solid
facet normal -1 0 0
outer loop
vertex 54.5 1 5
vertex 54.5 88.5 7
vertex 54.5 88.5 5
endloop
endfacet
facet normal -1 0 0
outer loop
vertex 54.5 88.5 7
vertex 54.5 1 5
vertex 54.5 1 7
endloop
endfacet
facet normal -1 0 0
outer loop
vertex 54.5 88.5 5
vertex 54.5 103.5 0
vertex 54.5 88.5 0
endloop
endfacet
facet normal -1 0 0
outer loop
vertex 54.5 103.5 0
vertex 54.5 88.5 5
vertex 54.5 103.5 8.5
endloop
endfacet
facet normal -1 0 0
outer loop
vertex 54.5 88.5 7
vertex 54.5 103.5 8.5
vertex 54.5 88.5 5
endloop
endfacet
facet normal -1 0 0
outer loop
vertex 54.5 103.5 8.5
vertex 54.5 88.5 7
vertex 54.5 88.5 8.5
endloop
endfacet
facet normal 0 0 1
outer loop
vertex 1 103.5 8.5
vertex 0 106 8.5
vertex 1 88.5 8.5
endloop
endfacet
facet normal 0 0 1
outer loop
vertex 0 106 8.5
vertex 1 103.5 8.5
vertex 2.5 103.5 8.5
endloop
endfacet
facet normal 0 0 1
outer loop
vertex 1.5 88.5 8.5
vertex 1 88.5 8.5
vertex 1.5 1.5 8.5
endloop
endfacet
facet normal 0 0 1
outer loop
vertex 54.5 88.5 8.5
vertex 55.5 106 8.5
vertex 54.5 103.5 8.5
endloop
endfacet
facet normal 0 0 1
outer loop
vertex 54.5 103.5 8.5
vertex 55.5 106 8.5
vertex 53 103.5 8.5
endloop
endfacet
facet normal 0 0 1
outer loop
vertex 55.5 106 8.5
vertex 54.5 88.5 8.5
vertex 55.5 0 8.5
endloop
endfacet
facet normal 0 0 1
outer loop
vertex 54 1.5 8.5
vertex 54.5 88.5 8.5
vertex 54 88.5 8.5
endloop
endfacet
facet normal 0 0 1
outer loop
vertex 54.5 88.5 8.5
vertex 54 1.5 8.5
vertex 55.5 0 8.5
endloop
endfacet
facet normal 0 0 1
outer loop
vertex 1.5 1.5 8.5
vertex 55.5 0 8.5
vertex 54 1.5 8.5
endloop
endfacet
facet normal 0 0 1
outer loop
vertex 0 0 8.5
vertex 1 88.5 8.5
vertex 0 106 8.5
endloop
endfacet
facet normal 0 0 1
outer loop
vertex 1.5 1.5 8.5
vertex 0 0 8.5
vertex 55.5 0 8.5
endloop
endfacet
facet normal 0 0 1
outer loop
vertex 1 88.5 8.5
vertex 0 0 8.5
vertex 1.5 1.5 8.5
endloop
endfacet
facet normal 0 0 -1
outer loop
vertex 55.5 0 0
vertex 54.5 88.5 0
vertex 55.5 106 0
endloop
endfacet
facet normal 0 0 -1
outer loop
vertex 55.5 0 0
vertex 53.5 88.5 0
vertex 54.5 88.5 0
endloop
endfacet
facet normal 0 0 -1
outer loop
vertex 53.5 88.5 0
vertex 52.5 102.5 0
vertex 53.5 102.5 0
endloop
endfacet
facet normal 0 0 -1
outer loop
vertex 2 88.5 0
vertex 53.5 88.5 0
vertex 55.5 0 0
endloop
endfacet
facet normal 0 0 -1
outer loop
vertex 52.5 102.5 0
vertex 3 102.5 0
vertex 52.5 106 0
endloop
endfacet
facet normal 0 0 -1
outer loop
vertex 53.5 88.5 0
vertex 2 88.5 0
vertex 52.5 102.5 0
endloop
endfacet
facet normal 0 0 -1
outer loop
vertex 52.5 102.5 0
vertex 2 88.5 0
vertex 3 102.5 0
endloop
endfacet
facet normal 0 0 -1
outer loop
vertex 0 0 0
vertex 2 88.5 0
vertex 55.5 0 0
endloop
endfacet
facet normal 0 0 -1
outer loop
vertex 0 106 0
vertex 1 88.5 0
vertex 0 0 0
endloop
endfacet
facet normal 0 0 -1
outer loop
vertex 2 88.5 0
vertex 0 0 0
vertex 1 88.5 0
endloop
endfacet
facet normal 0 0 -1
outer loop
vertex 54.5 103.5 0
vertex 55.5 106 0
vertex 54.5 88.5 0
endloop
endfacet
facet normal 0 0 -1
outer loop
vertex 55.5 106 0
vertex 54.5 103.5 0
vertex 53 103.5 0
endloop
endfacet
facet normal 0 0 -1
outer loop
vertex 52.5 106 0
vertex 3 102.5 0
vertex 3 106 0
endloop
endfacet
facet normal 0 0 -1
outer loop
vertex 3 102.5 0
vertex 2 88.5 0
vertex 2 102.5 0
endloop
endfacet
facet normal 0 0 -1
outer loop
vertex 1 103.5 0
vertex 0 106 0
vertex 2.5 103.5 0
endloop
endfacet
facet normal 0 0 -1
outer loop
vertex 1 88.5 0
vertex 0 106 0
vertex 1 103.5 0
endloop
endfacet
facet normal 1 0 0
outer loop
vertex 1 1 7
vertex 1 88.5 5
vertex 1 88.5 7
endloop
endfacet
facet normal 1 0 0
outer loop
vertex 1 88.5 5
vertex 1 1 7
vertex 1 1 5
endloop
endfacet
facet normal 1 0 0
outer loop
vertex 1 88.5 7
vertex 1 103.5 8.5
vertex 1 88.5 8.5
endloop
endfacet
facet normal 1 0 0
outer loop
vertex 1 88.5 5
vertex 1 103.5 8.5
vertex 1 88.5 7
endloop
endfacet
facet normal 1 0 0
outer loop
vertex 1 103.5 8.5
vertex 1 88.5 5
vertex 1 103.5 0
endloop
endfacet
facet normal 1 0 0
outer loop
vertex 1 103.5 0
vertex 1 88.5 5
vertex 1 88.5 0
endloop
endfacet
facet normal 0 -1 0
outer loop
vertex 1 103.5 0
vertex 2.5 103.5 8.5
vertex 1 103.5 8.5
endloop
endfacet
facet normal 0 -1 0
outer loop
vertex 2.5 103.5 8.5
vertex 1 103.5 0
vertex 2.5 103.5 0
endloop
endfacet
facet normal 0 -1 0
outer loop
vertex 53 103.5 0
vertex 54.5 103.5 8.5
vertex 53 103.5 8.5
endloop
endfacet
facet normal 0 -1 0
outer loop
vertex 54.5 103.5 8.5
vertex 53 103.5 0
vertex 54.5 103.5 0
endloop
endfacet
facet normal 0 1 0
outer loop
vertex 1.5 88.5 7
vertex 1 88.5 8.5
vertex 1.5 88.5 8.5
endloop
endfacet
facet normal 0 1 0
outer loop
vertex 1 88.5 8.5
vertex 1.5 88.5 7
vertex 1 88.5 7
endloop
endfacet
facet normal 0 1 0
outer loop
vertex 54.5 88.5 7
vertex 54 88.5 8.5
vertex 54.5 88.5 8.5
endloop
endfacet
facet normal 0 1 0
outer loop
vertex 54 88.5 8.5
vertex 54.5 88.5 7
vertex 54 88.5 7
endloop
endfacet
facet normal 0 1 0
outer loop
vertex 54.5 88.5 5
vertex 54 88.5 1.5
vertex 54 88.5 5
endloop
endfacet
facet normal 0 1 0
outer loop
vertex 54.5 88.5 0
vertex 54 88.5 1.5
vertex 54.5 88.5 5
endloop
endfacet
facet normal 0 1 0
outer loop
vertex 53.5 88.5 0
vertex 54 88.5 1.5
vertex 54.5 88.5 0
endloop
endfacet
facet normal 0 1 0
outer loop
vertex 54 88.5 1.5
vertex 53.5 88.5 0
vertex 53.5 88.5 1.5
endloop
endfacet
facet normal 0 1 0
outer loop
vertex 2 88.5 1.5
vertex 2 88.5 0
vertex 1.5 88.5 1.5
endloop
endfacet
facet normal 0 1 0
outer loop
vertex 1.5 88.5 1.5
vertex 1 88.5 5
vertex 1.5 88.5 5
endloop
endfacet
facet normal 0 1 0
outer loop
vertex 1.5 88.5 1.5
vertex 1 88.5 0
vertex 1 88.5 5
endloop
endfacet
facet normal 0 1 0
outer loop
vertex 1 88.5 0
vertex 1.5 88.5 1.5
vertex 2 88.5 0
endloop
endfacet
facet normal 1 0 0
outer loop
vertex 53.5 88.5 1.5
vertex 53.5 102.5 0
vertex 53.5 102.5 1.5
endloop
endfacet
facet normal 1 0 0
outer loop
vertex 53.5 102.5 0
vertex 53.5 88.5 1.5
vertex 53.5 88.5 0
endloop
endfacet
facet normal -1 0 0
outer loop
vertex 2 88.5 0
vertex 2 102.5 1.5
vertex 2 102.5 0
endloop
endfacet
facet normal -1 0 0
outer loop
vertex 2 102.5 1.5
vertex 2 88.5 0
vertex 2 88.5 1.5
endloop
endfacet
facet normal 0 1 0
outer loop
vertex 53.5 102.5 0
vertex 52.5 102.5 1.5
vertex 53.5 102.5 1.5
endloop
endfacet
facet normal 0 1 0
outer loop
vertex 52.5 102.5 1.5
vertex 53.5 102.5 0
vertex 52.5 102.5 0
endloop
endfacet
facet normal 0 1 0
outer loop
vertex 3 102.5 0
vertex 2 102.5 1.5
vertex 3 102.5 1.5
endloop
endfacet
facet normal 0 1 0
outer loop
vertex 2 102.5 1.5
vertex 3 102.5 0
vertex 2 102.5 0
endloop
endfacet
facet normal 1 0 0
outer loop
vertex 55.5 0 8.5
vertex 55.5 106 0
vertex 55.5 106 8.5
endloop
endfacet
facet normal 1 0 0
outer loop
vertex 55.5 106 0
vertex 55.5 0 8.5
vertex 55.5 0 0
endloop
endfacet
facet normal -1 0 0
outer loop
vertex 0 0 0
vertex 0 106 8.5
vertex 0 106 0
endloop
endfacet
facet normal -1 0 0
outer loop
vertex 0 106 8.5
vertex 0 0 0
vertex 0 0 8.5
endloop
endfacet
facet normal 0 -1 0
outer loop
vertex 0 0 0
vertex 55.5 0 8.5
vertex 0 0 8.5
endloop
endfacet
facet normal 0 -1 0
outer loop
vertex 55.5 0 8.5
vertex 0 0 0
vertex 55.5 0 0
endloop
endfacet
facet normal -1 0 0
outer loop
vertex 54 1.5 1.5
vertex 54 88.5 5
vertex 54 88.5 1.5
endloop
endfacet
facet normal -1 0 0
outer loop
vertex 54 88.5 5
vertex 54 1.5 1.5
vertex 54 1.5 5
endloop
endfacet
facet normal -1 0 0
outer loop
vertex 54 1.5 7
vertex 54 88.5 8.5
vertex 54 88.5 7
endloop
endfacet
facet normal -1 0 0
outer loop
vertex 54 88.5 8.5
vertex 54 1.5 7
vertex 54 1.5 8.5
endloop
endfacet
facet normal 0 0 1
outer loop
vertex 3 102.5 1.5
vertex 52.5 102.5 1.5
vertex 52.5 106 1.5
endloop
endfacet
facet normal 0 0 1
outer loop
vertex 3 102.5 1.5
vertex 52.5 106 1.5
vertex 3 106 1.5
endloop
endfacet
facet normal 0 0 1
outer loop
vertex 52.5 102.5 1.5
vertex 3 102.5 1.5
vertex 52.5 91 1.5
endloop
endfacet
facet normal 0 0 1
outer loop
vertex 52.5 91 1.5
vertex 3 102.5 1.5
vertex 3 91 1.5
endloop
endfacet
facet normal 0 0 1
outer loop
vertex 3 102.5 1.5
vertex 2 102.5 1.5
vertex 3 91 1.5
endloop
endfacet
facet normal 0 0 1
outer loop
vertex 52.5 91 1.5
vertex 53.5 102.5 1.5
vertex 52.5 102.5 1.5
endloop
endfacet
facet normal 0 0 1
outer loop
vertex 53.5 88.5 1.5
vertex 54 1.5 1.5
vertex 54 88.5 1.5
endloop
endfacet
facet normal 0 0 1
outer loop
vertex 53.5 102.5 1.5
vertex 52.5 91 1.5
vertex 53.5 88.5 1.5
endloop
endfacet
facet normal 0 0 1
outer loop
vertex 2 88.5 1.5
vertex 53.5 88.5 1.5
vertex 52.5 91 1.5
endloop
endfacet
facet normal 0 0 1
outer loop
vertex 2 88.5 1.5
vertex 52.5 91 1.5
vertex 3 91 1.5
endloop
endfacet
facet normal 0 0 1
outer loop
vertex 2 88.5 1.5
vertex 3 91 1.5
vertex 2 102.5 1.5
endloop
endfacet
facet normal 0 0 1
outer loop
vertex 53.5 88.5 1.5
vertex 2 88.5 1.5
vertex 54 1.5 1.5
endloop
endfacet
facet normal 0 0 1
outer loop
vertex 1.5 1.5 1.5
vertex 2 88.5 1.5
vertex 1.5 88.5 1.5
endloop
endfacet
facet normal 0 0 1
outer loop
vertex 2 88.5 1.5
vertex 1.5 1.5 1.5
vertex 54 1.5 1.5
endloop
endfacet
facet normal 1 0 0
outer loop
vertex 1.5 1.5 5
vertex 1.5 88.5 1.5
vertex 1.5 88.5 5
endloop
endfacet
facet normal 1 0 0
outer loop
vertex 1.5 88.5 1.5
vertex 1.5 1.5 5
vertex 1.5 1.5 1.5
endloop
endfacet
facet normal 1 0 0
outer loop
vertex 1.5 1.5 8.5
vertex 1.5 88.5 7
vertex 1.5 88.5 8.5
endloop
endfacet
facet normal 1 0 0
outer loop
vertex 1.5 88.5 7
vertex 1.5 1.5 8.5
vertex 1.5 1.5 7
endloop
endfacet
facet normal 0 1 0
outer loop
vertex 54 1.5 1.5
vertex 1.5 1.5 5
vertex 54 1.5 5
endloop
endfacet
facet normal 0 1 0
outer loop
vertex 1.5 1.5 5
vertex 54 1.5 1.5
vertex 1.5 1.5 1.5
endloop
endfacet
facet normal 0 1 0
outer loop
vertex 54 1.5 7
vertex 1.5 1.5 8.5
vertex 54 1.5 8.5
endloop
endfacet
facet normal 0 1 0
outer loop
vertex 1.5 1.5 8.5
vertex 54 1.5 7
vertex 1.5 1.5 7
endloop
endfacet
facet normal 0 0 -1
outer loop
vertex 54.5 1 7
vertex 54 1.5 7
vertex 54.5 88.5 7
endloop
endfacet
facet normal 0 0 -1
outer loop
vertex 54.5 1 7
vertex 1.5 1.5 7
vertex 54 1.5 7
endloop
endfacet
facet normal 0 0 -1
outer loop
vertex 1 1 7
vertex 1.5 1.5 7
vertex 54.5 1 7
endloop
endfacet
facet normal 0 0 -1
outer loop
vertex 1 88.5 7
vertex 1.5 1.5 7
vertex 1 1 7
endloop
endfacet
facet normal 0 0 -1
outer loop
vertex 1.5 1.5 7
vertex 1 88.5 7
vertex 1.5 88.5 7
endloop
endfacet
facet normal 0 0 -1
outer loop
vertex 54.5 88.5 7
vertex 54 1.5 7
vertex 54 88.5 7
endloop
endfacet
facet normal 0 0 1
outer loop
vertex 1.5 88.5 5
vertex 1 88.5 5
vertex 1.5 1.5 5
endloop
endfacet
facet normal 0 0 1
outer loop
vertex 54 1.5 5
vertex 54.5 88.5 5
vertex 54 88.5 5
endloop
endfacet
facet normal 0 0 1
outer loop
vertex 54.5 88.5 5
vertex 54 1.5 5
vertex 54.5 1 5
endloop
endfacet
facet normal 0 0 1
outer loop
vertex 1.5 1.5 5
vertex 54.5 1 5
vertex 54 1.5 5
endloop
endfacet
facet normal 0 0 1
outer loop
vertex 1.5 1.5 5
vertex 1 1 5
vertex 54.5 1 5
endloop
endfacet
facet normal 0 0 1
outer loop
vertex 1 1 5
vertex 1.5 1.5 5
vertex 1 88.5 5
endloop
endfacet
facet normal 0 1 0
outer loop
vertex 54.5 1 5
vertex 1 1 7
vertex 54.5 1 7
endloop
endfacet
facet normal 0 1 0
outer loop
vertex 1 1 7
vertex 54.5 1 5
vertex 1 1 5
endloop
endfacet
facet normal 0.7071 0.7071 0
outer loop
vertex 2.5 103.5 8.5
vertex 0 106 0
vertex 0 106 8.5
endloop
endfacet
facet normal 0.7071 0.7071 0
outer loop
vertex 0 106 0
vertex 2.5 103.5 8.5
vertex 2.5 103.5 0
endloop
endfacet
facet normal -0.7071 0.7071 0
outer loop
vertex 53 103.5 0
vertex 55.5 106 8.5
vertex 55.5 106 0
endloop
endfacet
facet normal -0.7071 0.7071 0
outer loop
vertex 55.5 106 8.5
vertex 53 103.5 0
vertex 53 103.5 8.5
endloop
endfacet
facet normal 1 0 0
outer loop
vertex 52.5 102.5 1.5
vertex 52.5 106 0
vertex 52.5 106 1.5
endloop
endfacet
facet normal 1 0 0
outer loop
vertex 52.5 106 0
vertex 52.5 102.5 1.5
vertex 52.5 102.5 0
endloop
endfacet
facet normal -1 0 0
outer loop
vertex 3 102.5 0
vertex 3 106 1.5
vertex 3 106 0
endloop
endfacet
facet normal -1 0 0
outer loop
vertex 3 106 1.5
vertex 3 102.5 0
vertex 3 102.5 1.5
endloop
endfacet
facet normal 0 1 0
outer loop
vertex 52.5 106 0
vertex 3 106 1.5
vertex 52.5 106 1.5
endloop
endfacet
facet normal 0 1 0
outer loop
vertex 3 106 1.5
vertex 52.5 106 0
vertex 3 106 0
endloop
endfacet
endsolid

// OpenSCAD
/*
 * University of Illinois/NCSA
 * Open Source License
 *
 *  Copyright (c) 2007-2008,The Board of Trustees of the University of
 *  Illinois.  All rights reserved.
 *
 *  Copyright (c) 2012 Sam King
 *
 *  Developed by:
 *
 *  Professor Sam King in the Department of Computer Science
 *  The University of Illinois at Urbana-Champaign
 *      http://www.cs.illinois.edu/homes/kingst/Research.html
 *
 *       Permission is hereby granted, free of charge, to any person
 *       obtaining a copy of this software and associated
 *       documentation files (the "Software"), to deal with the
 *       Software without restriction, including without limitation
 *       the rights to use, copy, modify, merge, publish, distribute,
 *       sublicense, and/or sell copies of the Software, and to permit
 *       persons to whom the Software is furnished to do so, subject
 *       to the following conditions:
 *
 *          Redistributions of source code must retain the above
 *          copyright notice, this list of conditions and the
 *          following disclaimers.
 *
 *          Redistributions in binary form must reproduce the above
 *          copyright notice, this list of conditions and the
 *          following disclaimers in the documentation and/or other
 *          materials provided with the distribution.
 *
 *          Neither the names of Sam King, the University of Illinois,
 *          nor the names of its contributors may be used to endorse
 *          or promote products derived from this Software without
 *          specific prior written permission.
 *
 *  THE SOFTWARE IS PROVIDED "AS IS", WITHOUT WARRANTY OF ANY KIND,
 *  EXPRESS OR IMPLIED, INCLUDING BUT NOT LIMITED TO THE WARRANTIES OF
 *  MERCHANTABILITY, FITNESS FOR A PARTICULAR PURPOSE AND
 *  NONINFRINGEMENT.  IN NO EVENT SHALL THE CONTRIBUTORS OR COPYRIGHT
 *  HOLDERS BE LIABLE FOR ANY CLAIM, DAMAGES OR OTHER LIABILITY,
 *  WHETHER IN AN ACTION OF CONTRACT, TORT OR OTHERWISE, ARISING FROM,
 *  OUT OF OR IN CONNECTION WITH THE SOFTWARE OR THE USE OR OTHER
 *  DEALINGS WITH THE SOFTWARE.
*/
Eps=0.01;

wall=1.5;   // old 2
// Placa Arduino
a_x = 53.5;
a_y = 69.5;  // UNO
a_y = 102.5;  //MEGA, DUE
a_z = 2;
groove=.5;

// Clip
clip_width = 15;
clip_wall = 1.5;    // old 2
clip_edge = 2.5;

// Constor Exterior
out_x = a_x + wall*2 - groove*2;
echo(out_x=out_x);
out_y = a_y + wall - groove;
echo(out_y=out_y);
out_z = 8.5;

// Hueco Interior
in_x = a_x - groove*2;
in_y = a_y - groove;
in_z = out_z - wall;

difference() {
    // Cos Principal
	cube([out_x,out_y,out_z]);
    // Hueco Interior
	translate([wall,wall,wall])
     cube([in_x, in_y, in_z+Eps]);
    // Ranura Interior
	translate([wall-groove, wall-groove, out_z-wall-a_z])
     cube([a_x, a_y, a_z]);
    difference(){
	 translate([wall-groove, out_y-clip_width, 0])
	  cube([out_x-wall*2+groove*2, clip_width, out_z]);
     translate([wall-groove+1, out_y-clip_width-1, 0])
      cube([out_x-wall*2+groove*2-2, clip_width, out_z]);
    }
}

// Pintes Clip
linear_extrude(height = out_z, center = false, convexity = 10, twist = 0)
 translate([0, out_y, 0])
  polygon([[0,0],[clip_edge,0],[0,clip_edge]]);

linear_extrude(height = out_z, center = false, convexity = 10, twist = 0)
	translate([out_x, out_y, 0])
	polygon([[0,0],[-clip_edge,0],[0,clip_edge]]);

// Externsió inferior
translate([wall-groove+2, out_y-clip_width+2.5, 0])
 cube([out_x-wall*2+groove*2-4, clip_width, wall]);
